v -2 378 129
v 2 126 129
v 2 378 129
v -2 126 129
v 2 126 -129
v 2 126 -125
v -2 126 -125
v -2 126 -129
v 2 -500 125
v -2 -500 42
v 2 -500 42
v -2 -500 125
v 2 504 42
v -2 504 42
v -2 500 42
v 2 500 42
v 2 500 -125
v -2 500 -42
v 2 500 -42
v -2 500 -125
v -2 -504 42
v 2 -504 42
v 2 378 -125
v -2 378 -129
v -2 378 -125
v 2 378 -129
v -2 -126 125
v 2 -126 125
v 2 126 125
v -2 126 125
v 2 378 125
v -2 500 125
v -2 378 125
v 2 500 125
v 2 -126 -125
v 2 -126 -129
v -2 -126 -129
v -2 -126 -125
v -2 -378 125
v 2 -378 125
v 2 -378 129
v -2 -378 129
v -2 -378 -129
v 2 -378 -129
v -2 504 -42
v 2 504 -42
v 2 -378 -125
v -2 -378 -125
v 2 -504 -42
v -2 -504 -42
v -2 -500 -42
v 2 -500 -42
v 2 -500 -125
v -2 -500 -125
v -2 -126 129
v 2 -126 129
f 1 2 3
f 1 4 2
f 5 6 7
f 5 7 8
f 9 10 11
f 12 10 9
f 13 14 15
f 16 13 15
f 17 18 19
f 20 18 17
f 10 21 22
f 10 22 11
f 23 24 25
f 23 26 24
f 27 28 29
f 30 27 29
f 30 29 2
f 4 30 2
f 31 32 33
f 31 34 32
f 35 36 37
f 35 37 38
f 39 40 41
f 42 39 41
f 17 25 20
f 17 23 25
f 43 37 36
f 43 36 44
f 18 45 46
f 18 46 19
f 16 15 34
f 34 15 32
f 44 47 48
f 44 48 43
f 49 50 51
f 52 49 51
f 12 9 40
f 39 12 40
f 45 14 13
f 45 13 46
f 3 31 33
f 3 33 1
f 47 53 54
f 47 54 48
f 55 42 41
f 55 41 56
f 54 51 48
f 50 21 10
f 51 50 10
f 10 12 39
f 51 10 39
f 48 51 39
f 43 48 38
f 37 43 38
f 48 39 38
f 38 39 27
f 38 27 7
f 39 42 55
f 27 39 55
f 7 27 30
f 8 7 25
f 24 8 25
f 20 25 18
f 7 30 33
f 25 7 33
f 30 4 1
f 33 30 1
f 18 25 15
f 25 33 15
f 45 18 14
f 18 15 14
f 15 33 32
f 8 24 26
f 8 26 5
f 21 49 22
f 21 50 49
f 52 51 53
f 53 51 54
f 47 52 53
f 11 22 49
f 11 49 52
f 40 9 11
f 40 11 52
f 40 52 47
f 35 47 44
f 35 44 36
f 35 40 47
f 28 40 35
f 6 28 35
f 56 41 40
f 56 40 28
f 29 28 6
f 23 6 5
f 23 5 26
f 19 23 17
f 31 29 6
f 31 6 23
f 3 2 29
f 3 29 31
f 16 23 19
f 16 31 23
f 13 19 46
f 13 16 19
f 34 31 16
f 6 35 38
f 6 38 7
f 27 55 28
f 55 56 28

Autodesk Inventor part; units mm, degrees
ref_plane "YZ Plane" through (0, 0, 0) normal (1, 0, 0) x (0, 1, 0)
ref_plane "XZ Plane" through (0, 0, 0) normal (0, 1, 0) x (-1, 0, 0)
ref_plane "XY Plane" through (0, 0, 0) normal (0, 0, 1) x (1, 0, 0)
sketch "Esboço1" plane through (0, 0, 0) normal (1, 0, 0) x (0, 1, 0)
  line L0 (-504, 129) -> (504, 129)
  line L1 (504, 129) -> (504, -129)
  line L2 (504, -129) -> (-504, -129)
  line L3 (-504, -129) -> (-504, 129)
  line L4 (-504, 129) -> (504, -129) construction
  line L5 (504, 129) -> (-504, -129) construction
  point P0 (0, 0)
  dimension "d0" = 1008
  dimension "d1" = 258
extrude "Extrusão1" add sketch "Esboço1" along normal mid plane 4
sketch "Esboço3" plane through (2, 0, 0) normal (1, 0, 0) x (0, 0, -1)
  line L0 (-133, 630) -> (-125, 630)
  line L1 (-125, 630) -> (-125, 378)
  line L2 (-125, 378) -> (-133, 378)
  line L3 (-133, 378) -> (-133, 630)
  line L4 (129, 504) -> (-129, 504) projected
  line L5 (-133, 630) -> (-125, 378) construction
  line L6 (-125, 630) -> (-133, 378) construction
  line L7 (-125, 126) -> (-133, 126)
  line L8 (-133, 126) -> (-133, -126)
  line L9 (-133, -126) -> (-125, -126)
  line L10 (-125, -126) -> (-125, 126)
  line L11 (-129, 504) -> (-129, -504) projected
  line L12 (-125, 126) -> (-133, -126) construction
  line L13 (-133, 126) -> (-125, -126) construction
  line L14 (-125, -378) -> (-133, -378)
  line L15 (-133, -378) -> (-133, -630)
  line L16 (-133, -630) -> (-125, -630)
  line L17 (-125, -630) -> (-125, -378)
  line L18 (-125, -378) -> (-133, -630) construction
  line L19 (-133, -378) -> (-125, -630) construction
  line L20 (125, 630) -> (133, 630)
  line L21 (133, 630) -> (133, 378)
  line L22 (133, 378) -> (125, 378)
  line L23 (125, 378) -> (125, 630)
  line L24 (125, 630) -> (133, 378) construction
  line L25 (133, 630) -> (125, 378) construction
  line L26 (125, 126) -> (133, 126)
  line L27 (133, 126) -> (133, -126)
  line L28 (133, -126) -> (125, -126)
  line L29 (125, -126) -> (125, 126)
  line L30 (129, -504) -> (129, 504) projected
  line L31 (125, 126) -> (133, -126) construction
  line L32 (133, 126) -> (125, -126) construction
  line L33 (125, -378) -> (133, -378)
  line L34 (133, -378) -> (133, -630)
  line L35 (133, -630) -> (125, -630)
  line L36 (125, -630) -> (125, -378)
  line L37 (125, -378) -> (133, -630) construction
  line L38 (133, -378) -> (125, -630) construction
  point P0 (0, 0)
  point P1 (-129, 0)
  point P2 (-129, -504)
  point P3 (129, 0)
  dimension "d8" = 8
  dimension "d9" = 252
  dimension "d10" = 252
  dimension "d11" = 252
  dimension "d12" = 8
  dimension "d13" = 252
  dimension "d14" = 8
  dimension "d15" = 252
  dimension "d16" = 8
  dimension "d17" = 252
  dimension "d18" = 252
  dimension "d19" = 8
  dimension "d20" = 252
  dimension "d21" = 252
  dimension "d22" = 8
  dimension "d23" = 252
extrude "Extrusão3" cut sketch "Esboço3" along normal through all both and the other way through all
sketch "Esboço4" plane through (2, 0, 0) normal (1, 0, 0) x (0, 0, -1)
  line L0 (-125, 504) -> (125, 504) projected
  line L1 (-125, 504) -> (-42, 504)
  line L2 (-42, 504) -> (-42, 500)
  line L3 (-42, 500) -> (-125, 500)
  line L4 (-125, 500) -> (-125, 504)
  line L5 (125, 504) -> (42, 504)
  line L6 (42, 504) -> (42, 500)
  line L7 (42, 500) -> (125, 500)
  line L8 (125, 500) -> (125, 504)
  line L9 (-125, -504) -> (125, -504) projected
  line L10 (-125, -504) -> (-42, -504)
  line L11 (-42, -504) -> (-42, -500)
  line L12 (-42, -500) -> (-125, -500)
  line L13 (-125, -500) -> (-125, -504)
  line L14 (125, -504) -> (42, -504)
  line L15 (42, -504) -> (42, -500)
  line L16 (42, -500) -> (125, -500)
  line L17 (125, -500) -> (125, -504)
  point P0 (0, 0)
  dimension "d26" = 83
  dimension "d27" = 4
  dimension "d28" = 83
  dimension "d29" = 4
  dimension "d30" = 84
  dimension "d31" = 83
  dimension "d32" = 4
  dimension "d33" = 83
  dimension "d34" = 4
  dimension "d35" = 84
extrude "Extrusão4" cut sketch "Esboço4" along normal through all both and the other way through all
sketch "Esboço6" plane through (2, 0, 0) normal (1, 0, 0) x (0, 0, -1)
  point P0 (0, 0)
properties part number "PAREDES LATERAIS"
